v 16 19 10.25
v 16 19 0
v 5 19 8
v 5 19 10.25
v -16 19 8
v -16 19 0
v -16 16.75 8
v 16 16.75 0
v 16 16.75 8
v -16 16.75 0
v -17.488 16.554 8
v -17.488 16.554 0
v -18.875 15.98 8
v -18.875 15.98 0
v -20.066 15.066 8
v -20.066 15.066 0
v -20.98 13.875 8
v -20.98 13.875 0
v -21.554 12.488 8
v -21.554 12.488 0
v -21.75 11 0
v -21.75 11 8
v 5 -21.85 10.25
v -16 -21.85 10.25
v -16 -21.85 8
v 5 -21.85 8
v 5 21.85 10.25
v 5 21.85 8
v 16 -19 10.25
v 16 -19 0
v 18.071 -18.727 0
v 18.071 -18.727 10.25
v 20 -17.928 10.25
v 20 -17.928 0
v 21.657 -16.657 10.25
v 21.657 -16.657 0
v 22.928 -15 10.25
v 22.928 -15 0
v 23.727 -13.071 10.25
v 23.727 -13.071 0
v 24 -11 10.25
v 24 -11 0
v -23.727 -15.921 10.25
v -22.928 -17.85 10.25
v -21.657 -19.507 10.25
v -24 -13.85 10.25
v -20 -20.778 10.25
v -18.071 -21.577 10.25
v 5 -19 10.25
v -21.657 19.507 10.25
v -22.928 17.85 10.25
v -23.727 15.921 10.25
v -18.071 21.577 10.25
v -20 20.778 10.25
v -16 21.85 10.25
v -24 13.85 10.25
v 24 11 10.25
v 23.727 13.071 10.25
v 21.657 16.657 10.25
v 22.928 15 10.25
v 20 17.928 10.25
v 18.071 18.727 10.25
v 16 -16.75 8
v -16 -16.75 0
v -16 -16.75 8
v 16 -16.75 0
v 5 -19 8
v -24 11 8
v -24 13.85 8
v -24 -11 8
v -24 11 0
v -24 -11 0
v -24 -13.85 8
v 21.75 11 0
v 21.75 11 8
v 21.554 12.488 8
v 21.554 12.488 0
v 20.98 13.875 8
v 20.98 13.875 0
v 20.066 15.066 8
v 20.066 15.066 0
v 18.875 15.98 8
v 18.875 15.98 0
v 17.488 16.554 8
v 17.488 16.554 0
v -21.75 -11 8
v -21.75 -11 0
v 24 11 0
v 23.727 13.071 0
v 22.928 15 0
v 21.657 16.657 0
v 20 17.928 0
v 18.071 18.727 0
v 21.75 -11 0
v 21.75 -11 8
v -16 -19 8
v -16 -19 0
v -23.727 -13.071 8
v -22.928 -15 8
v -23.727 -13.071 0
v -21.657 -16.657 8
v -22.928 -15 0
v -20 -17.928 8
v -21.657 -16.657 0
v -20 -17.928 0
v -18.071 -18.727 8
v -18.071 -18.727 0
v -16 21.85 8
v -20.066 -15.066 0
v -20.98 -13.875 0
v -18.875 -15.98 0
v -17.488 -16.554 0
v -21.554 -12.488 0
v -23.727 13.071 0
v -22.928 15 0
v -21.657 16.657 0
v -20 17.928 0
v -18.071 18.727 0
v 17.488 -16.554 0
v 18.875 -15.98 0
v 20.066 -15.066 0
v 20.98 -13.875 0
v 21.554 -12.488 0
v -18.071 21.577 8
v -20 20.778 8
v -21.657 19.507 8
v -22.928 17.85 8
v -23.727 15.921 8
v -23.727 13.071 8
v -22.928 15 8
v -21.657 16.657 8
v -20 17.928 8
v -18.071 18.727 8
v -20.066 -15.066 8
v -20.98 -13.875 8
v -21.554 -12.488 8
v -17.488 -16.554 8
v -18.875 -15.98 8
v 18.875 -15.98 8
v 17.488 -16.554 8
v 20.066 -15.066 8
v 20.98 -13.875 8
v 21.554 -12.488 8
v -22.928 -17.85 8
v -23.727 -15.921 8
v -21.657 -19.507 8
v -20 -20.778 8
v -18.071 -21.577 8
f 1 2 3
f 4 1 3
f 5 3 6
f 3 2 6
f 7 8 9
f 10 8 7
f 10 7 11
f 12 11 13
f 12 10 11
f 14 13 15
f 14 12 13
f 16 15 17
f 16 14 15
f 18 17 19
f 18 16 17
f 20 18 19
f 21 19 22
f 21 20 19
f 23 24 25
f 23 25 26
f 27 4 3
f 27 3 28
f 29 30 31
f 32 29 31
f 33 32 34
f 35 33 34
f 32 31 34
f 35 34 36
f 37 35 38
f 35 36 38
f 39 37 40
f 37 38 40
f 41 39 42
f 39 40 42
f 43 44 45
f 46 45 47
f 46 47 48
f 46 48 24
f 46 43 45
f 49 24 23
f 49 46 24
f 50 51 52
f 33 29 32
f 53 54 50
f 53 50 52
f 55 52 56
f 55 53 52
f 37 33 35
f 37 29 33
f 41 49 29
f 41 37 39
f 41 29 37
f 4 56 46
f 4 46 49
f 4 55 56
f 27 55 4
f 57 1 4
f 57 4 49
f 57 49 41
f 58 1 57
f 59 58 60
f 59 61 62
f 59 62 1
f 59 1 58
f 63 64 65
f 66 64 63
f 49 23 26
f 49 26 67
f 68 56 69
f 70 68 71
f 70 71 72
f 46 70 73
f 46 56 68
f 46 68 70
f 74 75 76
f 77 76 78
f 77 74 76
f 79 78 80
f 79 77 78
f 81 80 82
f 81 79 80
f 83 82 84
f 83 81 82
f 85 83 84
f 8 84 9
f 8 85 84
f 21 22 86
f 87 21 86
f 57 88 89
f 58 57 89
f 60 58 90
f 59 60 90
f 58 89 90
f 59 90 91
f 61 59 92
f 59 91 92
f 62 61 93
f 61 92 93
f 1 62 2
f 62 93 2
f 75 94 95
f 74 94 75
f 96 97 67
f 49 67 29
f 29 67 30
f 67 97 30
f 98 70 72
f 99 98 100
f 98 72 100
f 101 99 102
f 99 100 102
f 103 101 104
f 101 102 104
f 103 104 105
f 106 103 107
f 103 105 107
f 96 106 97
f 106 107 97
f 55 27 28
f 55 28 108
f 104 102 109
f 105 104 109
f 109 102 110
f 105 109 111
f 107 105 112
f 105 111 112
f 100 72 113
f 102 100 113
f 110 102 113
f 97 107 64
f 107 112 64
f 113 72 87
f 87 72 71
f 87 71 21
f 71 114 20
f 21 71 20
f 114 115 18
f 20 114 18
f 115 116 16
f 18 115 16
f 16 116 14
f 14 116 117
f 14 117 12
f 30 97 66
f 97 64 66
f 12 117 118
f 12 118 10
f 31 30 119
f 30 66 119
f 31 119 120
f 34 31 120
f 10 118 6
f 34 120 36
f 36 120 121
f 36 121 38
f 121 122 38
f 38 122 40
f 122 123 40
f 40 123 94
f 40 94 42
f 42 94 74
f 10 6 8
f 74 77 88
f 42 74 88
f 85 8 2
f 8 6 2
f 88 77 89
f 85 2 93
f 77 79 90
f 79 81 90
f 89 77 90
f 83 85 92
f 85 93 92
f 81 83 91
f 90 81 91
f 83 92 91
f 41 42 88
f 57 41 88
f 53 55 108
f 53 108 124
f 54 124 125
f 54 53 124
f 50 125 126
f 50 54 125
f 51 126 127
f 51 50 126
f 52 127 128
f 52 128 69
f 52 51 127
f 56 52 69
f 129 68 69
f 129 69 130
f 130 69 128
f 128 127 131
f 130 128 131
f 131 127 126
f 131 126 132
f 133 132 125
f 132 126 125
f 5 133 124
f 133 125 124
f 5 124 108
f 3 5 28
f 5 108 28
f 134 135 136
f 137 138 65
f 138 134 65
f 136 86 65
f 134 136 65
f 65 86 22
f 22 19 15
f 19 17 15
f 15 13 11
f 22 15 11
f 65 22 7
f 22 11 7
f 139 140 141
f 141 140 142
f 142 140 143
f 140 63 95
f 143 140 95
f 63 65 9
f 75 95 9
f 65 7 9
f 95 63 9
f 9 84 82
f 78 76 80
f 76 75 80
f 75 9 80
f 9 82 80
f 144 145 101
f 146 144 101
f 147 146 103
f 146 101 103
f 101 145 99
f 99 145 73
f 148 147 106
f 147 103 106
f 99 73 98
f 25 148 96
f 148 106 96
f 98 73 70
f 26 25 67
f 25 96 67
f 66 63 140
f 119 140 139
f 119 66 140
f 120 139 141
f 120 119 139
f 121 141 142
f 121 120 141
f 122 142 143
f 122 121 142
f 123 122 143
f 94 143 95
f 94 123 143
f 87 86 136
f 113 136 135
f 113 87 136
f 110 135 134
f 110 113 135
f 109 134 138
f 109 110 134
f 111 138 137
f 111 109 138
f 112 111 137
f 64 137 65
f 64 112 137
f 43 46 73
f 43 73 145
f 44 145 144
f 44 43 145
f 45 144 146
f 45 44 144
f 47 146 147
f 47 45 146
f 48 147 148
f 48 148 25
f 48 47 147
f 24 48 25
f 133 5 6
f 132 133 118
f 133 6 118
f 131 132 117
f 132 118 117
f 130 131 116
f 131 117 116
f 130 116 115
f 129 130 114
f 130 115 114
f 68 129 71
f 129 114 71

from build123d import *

# Parameters (mm, degrees)
F1_DEPTH     = 10.25
F3_DEPTH     = 2.25
F4_T         = 2.25
F4_T3_DEPTH  = 25.5
F4_T5_DEPTH  = 6.75
F4_T8_ANGLE  = 90.000000001
F4_T10_ANGLE = 90.000000001


# Not quite as in the source:
# - a shell that OpenCascade refuses in one call is made with other operations: the cavity is built on its own and cut out


with BuildPart() as f1:
    # F0 (on Top) → F1 (new body)
    with BuildSketch(Plane.XY):
        with BuildLine():
            Line((16, 19), (-16, 19))
            ThreePointArc((-16, 19), (-21.6568542495, 16.6568542495), (-24, 11))
            Line((-24, 11), (-24, -11))
            ThreePointArc((-24, -11), (-21.6568542495, -16.6568542495), (-16, -19))
            Line((-16, -19), (16, -19))
            ThreePointArc((16, -19), (21.6568542495, -16.6568542495), (24, -11))
            Line((24, -11), (24, 11))
            ThreePointArc((24, 11), (21.6568542495, 16.6568542495), (16, 19))
        make_face()
    extrude(amount=F1_DEPTH)

    # F2 (on face) → F3 (join)
    with BuildSketch(Plane.XY.offset(10.25)):
        with BuildLine():
            Line((5, 21.85), (-16, 21.85))
            ThreePointArc((-16, 21.85), (-21.6568542495, 19.5068542495), (-24, 13.85))
            Line((-24, 13.85), (-24, -13.85))
            ThreePointArc((-24, -13.85), (-21.6568542495, -19.5068542495), (-16, -21.85))
            Line((-16, -21.85), (5, -21.85))
            Line((5, -21.85), (5, 21.85))
        make_face()
    extrude(amount=-F3_DEPTH)

    # F4: shell of thickness 2.25, made by hand


with BuildPart() as f4_core1:
    # F4_t2: copy of F1
    add(f1.part)

    # the walls: a layer under each face that stays
    f4_faces = [f4_core1.faces().sort_by_distance(p)[0] for p in [
        (0, 19, 5.125),
        (21.6568542495, 16.6568542495, 5.125),
        (24, 0, 5.125),
        (21.6568542495, -16.6568542495, 5.125),
        (0, -19, 5.125),
        (-21.6568542495, -16.6568542495, 4),
        (-24, 0, 5.125),
        (-21.6568542495, -19.5068542495, 9.125),
        (-5.5, -21.85, 9.125),
        (-21.6568542495, 19.5068542495, 9.125),
        (-5.5, 21.85, 9.125),
        (-19.1666666667, -20.0416666667, 8),
        (5, -20.425, 9.125),
        (0, 0, 10.25),
        (5, 20.425, 9.125),
        (-19.1666666667, 20.0416666667, 8),
        (-21.6568542495, 16.6568542495, 4),
    ]]
    thicken(f4_faces, amount=-F4_T, mode=Mode.SUBTRACT)

    # F4_s4 → F4_t3 (cut)
    with BuildSketch(Plane.YZ.offset(-18.25)):
        Polygon((19.0225, 7.9775), (16.75, 8), (16.75, 10.25), (19, 10.25), align=None)
        Polygon((-19.0225, 7.9775), (-16.75, 8), (-16.75, 10.25), (-19, 10.25), align=None)
    extrude(amount=F4_T3_DEPTH, mode=Mode.SUBTRACT)

    # F4_s6 → F4_t5 (cut)
    with BuildSketch(Plane.XY.offset(5.75)):
        Polygon((5.0225, 19.0225), (5, 16.75), (2.75, 16.75), (2.75, 19), align=None)
        Polygon((5.0225, -19.0225), (5, -16.75), (2.75, -16.75), (2.75, -19), align=None)
    extrude(amount=F4_T5_DEPTH, mode=Mode.SUBTRACT)

    # F4_s7 → F4_t8 (revolve, cut)
    with BuildSketch(Plane.YZ.offset(-16)):
        Polygon((-19.0225, 7.9775), (-16.75, 8), (-16.75, 10.25), (-19, 10.25), align=None)
    revolve(axis=Axis((-16, -11, 8), (0, 0, -1)), revolution_arc=F4_T8_ANGLE, mode=Mode.SUBTRACT)

    # F4_s9 → F4_t10 (revolve, cut)
    with BuildSketch(Plane.XZ.offset(-11)):
        Polygon((-24.0225, 7.9775), (-24, 10.25), (-21.75, 10.25), (-21.75, 8), align=None)
    revolve(axis=Axis((-16, 11, 8), (0, 0, -1)), revolution_arc=F4_T10_ANGLE, mode=Mode.SUBTRACT)


with BuildPart() as f1_1:
    add(f1.part)

    # what is left inside the walls is the cavity
    f4_cavity = [f4_core1.part.solids().sort_by_distance(p)[0] for p in [
        (0, -5.583333, 7.9775),
    ]]
    add(f4_cavity, mode=Mode.SUBTRACT)


solid = f1_1.part
